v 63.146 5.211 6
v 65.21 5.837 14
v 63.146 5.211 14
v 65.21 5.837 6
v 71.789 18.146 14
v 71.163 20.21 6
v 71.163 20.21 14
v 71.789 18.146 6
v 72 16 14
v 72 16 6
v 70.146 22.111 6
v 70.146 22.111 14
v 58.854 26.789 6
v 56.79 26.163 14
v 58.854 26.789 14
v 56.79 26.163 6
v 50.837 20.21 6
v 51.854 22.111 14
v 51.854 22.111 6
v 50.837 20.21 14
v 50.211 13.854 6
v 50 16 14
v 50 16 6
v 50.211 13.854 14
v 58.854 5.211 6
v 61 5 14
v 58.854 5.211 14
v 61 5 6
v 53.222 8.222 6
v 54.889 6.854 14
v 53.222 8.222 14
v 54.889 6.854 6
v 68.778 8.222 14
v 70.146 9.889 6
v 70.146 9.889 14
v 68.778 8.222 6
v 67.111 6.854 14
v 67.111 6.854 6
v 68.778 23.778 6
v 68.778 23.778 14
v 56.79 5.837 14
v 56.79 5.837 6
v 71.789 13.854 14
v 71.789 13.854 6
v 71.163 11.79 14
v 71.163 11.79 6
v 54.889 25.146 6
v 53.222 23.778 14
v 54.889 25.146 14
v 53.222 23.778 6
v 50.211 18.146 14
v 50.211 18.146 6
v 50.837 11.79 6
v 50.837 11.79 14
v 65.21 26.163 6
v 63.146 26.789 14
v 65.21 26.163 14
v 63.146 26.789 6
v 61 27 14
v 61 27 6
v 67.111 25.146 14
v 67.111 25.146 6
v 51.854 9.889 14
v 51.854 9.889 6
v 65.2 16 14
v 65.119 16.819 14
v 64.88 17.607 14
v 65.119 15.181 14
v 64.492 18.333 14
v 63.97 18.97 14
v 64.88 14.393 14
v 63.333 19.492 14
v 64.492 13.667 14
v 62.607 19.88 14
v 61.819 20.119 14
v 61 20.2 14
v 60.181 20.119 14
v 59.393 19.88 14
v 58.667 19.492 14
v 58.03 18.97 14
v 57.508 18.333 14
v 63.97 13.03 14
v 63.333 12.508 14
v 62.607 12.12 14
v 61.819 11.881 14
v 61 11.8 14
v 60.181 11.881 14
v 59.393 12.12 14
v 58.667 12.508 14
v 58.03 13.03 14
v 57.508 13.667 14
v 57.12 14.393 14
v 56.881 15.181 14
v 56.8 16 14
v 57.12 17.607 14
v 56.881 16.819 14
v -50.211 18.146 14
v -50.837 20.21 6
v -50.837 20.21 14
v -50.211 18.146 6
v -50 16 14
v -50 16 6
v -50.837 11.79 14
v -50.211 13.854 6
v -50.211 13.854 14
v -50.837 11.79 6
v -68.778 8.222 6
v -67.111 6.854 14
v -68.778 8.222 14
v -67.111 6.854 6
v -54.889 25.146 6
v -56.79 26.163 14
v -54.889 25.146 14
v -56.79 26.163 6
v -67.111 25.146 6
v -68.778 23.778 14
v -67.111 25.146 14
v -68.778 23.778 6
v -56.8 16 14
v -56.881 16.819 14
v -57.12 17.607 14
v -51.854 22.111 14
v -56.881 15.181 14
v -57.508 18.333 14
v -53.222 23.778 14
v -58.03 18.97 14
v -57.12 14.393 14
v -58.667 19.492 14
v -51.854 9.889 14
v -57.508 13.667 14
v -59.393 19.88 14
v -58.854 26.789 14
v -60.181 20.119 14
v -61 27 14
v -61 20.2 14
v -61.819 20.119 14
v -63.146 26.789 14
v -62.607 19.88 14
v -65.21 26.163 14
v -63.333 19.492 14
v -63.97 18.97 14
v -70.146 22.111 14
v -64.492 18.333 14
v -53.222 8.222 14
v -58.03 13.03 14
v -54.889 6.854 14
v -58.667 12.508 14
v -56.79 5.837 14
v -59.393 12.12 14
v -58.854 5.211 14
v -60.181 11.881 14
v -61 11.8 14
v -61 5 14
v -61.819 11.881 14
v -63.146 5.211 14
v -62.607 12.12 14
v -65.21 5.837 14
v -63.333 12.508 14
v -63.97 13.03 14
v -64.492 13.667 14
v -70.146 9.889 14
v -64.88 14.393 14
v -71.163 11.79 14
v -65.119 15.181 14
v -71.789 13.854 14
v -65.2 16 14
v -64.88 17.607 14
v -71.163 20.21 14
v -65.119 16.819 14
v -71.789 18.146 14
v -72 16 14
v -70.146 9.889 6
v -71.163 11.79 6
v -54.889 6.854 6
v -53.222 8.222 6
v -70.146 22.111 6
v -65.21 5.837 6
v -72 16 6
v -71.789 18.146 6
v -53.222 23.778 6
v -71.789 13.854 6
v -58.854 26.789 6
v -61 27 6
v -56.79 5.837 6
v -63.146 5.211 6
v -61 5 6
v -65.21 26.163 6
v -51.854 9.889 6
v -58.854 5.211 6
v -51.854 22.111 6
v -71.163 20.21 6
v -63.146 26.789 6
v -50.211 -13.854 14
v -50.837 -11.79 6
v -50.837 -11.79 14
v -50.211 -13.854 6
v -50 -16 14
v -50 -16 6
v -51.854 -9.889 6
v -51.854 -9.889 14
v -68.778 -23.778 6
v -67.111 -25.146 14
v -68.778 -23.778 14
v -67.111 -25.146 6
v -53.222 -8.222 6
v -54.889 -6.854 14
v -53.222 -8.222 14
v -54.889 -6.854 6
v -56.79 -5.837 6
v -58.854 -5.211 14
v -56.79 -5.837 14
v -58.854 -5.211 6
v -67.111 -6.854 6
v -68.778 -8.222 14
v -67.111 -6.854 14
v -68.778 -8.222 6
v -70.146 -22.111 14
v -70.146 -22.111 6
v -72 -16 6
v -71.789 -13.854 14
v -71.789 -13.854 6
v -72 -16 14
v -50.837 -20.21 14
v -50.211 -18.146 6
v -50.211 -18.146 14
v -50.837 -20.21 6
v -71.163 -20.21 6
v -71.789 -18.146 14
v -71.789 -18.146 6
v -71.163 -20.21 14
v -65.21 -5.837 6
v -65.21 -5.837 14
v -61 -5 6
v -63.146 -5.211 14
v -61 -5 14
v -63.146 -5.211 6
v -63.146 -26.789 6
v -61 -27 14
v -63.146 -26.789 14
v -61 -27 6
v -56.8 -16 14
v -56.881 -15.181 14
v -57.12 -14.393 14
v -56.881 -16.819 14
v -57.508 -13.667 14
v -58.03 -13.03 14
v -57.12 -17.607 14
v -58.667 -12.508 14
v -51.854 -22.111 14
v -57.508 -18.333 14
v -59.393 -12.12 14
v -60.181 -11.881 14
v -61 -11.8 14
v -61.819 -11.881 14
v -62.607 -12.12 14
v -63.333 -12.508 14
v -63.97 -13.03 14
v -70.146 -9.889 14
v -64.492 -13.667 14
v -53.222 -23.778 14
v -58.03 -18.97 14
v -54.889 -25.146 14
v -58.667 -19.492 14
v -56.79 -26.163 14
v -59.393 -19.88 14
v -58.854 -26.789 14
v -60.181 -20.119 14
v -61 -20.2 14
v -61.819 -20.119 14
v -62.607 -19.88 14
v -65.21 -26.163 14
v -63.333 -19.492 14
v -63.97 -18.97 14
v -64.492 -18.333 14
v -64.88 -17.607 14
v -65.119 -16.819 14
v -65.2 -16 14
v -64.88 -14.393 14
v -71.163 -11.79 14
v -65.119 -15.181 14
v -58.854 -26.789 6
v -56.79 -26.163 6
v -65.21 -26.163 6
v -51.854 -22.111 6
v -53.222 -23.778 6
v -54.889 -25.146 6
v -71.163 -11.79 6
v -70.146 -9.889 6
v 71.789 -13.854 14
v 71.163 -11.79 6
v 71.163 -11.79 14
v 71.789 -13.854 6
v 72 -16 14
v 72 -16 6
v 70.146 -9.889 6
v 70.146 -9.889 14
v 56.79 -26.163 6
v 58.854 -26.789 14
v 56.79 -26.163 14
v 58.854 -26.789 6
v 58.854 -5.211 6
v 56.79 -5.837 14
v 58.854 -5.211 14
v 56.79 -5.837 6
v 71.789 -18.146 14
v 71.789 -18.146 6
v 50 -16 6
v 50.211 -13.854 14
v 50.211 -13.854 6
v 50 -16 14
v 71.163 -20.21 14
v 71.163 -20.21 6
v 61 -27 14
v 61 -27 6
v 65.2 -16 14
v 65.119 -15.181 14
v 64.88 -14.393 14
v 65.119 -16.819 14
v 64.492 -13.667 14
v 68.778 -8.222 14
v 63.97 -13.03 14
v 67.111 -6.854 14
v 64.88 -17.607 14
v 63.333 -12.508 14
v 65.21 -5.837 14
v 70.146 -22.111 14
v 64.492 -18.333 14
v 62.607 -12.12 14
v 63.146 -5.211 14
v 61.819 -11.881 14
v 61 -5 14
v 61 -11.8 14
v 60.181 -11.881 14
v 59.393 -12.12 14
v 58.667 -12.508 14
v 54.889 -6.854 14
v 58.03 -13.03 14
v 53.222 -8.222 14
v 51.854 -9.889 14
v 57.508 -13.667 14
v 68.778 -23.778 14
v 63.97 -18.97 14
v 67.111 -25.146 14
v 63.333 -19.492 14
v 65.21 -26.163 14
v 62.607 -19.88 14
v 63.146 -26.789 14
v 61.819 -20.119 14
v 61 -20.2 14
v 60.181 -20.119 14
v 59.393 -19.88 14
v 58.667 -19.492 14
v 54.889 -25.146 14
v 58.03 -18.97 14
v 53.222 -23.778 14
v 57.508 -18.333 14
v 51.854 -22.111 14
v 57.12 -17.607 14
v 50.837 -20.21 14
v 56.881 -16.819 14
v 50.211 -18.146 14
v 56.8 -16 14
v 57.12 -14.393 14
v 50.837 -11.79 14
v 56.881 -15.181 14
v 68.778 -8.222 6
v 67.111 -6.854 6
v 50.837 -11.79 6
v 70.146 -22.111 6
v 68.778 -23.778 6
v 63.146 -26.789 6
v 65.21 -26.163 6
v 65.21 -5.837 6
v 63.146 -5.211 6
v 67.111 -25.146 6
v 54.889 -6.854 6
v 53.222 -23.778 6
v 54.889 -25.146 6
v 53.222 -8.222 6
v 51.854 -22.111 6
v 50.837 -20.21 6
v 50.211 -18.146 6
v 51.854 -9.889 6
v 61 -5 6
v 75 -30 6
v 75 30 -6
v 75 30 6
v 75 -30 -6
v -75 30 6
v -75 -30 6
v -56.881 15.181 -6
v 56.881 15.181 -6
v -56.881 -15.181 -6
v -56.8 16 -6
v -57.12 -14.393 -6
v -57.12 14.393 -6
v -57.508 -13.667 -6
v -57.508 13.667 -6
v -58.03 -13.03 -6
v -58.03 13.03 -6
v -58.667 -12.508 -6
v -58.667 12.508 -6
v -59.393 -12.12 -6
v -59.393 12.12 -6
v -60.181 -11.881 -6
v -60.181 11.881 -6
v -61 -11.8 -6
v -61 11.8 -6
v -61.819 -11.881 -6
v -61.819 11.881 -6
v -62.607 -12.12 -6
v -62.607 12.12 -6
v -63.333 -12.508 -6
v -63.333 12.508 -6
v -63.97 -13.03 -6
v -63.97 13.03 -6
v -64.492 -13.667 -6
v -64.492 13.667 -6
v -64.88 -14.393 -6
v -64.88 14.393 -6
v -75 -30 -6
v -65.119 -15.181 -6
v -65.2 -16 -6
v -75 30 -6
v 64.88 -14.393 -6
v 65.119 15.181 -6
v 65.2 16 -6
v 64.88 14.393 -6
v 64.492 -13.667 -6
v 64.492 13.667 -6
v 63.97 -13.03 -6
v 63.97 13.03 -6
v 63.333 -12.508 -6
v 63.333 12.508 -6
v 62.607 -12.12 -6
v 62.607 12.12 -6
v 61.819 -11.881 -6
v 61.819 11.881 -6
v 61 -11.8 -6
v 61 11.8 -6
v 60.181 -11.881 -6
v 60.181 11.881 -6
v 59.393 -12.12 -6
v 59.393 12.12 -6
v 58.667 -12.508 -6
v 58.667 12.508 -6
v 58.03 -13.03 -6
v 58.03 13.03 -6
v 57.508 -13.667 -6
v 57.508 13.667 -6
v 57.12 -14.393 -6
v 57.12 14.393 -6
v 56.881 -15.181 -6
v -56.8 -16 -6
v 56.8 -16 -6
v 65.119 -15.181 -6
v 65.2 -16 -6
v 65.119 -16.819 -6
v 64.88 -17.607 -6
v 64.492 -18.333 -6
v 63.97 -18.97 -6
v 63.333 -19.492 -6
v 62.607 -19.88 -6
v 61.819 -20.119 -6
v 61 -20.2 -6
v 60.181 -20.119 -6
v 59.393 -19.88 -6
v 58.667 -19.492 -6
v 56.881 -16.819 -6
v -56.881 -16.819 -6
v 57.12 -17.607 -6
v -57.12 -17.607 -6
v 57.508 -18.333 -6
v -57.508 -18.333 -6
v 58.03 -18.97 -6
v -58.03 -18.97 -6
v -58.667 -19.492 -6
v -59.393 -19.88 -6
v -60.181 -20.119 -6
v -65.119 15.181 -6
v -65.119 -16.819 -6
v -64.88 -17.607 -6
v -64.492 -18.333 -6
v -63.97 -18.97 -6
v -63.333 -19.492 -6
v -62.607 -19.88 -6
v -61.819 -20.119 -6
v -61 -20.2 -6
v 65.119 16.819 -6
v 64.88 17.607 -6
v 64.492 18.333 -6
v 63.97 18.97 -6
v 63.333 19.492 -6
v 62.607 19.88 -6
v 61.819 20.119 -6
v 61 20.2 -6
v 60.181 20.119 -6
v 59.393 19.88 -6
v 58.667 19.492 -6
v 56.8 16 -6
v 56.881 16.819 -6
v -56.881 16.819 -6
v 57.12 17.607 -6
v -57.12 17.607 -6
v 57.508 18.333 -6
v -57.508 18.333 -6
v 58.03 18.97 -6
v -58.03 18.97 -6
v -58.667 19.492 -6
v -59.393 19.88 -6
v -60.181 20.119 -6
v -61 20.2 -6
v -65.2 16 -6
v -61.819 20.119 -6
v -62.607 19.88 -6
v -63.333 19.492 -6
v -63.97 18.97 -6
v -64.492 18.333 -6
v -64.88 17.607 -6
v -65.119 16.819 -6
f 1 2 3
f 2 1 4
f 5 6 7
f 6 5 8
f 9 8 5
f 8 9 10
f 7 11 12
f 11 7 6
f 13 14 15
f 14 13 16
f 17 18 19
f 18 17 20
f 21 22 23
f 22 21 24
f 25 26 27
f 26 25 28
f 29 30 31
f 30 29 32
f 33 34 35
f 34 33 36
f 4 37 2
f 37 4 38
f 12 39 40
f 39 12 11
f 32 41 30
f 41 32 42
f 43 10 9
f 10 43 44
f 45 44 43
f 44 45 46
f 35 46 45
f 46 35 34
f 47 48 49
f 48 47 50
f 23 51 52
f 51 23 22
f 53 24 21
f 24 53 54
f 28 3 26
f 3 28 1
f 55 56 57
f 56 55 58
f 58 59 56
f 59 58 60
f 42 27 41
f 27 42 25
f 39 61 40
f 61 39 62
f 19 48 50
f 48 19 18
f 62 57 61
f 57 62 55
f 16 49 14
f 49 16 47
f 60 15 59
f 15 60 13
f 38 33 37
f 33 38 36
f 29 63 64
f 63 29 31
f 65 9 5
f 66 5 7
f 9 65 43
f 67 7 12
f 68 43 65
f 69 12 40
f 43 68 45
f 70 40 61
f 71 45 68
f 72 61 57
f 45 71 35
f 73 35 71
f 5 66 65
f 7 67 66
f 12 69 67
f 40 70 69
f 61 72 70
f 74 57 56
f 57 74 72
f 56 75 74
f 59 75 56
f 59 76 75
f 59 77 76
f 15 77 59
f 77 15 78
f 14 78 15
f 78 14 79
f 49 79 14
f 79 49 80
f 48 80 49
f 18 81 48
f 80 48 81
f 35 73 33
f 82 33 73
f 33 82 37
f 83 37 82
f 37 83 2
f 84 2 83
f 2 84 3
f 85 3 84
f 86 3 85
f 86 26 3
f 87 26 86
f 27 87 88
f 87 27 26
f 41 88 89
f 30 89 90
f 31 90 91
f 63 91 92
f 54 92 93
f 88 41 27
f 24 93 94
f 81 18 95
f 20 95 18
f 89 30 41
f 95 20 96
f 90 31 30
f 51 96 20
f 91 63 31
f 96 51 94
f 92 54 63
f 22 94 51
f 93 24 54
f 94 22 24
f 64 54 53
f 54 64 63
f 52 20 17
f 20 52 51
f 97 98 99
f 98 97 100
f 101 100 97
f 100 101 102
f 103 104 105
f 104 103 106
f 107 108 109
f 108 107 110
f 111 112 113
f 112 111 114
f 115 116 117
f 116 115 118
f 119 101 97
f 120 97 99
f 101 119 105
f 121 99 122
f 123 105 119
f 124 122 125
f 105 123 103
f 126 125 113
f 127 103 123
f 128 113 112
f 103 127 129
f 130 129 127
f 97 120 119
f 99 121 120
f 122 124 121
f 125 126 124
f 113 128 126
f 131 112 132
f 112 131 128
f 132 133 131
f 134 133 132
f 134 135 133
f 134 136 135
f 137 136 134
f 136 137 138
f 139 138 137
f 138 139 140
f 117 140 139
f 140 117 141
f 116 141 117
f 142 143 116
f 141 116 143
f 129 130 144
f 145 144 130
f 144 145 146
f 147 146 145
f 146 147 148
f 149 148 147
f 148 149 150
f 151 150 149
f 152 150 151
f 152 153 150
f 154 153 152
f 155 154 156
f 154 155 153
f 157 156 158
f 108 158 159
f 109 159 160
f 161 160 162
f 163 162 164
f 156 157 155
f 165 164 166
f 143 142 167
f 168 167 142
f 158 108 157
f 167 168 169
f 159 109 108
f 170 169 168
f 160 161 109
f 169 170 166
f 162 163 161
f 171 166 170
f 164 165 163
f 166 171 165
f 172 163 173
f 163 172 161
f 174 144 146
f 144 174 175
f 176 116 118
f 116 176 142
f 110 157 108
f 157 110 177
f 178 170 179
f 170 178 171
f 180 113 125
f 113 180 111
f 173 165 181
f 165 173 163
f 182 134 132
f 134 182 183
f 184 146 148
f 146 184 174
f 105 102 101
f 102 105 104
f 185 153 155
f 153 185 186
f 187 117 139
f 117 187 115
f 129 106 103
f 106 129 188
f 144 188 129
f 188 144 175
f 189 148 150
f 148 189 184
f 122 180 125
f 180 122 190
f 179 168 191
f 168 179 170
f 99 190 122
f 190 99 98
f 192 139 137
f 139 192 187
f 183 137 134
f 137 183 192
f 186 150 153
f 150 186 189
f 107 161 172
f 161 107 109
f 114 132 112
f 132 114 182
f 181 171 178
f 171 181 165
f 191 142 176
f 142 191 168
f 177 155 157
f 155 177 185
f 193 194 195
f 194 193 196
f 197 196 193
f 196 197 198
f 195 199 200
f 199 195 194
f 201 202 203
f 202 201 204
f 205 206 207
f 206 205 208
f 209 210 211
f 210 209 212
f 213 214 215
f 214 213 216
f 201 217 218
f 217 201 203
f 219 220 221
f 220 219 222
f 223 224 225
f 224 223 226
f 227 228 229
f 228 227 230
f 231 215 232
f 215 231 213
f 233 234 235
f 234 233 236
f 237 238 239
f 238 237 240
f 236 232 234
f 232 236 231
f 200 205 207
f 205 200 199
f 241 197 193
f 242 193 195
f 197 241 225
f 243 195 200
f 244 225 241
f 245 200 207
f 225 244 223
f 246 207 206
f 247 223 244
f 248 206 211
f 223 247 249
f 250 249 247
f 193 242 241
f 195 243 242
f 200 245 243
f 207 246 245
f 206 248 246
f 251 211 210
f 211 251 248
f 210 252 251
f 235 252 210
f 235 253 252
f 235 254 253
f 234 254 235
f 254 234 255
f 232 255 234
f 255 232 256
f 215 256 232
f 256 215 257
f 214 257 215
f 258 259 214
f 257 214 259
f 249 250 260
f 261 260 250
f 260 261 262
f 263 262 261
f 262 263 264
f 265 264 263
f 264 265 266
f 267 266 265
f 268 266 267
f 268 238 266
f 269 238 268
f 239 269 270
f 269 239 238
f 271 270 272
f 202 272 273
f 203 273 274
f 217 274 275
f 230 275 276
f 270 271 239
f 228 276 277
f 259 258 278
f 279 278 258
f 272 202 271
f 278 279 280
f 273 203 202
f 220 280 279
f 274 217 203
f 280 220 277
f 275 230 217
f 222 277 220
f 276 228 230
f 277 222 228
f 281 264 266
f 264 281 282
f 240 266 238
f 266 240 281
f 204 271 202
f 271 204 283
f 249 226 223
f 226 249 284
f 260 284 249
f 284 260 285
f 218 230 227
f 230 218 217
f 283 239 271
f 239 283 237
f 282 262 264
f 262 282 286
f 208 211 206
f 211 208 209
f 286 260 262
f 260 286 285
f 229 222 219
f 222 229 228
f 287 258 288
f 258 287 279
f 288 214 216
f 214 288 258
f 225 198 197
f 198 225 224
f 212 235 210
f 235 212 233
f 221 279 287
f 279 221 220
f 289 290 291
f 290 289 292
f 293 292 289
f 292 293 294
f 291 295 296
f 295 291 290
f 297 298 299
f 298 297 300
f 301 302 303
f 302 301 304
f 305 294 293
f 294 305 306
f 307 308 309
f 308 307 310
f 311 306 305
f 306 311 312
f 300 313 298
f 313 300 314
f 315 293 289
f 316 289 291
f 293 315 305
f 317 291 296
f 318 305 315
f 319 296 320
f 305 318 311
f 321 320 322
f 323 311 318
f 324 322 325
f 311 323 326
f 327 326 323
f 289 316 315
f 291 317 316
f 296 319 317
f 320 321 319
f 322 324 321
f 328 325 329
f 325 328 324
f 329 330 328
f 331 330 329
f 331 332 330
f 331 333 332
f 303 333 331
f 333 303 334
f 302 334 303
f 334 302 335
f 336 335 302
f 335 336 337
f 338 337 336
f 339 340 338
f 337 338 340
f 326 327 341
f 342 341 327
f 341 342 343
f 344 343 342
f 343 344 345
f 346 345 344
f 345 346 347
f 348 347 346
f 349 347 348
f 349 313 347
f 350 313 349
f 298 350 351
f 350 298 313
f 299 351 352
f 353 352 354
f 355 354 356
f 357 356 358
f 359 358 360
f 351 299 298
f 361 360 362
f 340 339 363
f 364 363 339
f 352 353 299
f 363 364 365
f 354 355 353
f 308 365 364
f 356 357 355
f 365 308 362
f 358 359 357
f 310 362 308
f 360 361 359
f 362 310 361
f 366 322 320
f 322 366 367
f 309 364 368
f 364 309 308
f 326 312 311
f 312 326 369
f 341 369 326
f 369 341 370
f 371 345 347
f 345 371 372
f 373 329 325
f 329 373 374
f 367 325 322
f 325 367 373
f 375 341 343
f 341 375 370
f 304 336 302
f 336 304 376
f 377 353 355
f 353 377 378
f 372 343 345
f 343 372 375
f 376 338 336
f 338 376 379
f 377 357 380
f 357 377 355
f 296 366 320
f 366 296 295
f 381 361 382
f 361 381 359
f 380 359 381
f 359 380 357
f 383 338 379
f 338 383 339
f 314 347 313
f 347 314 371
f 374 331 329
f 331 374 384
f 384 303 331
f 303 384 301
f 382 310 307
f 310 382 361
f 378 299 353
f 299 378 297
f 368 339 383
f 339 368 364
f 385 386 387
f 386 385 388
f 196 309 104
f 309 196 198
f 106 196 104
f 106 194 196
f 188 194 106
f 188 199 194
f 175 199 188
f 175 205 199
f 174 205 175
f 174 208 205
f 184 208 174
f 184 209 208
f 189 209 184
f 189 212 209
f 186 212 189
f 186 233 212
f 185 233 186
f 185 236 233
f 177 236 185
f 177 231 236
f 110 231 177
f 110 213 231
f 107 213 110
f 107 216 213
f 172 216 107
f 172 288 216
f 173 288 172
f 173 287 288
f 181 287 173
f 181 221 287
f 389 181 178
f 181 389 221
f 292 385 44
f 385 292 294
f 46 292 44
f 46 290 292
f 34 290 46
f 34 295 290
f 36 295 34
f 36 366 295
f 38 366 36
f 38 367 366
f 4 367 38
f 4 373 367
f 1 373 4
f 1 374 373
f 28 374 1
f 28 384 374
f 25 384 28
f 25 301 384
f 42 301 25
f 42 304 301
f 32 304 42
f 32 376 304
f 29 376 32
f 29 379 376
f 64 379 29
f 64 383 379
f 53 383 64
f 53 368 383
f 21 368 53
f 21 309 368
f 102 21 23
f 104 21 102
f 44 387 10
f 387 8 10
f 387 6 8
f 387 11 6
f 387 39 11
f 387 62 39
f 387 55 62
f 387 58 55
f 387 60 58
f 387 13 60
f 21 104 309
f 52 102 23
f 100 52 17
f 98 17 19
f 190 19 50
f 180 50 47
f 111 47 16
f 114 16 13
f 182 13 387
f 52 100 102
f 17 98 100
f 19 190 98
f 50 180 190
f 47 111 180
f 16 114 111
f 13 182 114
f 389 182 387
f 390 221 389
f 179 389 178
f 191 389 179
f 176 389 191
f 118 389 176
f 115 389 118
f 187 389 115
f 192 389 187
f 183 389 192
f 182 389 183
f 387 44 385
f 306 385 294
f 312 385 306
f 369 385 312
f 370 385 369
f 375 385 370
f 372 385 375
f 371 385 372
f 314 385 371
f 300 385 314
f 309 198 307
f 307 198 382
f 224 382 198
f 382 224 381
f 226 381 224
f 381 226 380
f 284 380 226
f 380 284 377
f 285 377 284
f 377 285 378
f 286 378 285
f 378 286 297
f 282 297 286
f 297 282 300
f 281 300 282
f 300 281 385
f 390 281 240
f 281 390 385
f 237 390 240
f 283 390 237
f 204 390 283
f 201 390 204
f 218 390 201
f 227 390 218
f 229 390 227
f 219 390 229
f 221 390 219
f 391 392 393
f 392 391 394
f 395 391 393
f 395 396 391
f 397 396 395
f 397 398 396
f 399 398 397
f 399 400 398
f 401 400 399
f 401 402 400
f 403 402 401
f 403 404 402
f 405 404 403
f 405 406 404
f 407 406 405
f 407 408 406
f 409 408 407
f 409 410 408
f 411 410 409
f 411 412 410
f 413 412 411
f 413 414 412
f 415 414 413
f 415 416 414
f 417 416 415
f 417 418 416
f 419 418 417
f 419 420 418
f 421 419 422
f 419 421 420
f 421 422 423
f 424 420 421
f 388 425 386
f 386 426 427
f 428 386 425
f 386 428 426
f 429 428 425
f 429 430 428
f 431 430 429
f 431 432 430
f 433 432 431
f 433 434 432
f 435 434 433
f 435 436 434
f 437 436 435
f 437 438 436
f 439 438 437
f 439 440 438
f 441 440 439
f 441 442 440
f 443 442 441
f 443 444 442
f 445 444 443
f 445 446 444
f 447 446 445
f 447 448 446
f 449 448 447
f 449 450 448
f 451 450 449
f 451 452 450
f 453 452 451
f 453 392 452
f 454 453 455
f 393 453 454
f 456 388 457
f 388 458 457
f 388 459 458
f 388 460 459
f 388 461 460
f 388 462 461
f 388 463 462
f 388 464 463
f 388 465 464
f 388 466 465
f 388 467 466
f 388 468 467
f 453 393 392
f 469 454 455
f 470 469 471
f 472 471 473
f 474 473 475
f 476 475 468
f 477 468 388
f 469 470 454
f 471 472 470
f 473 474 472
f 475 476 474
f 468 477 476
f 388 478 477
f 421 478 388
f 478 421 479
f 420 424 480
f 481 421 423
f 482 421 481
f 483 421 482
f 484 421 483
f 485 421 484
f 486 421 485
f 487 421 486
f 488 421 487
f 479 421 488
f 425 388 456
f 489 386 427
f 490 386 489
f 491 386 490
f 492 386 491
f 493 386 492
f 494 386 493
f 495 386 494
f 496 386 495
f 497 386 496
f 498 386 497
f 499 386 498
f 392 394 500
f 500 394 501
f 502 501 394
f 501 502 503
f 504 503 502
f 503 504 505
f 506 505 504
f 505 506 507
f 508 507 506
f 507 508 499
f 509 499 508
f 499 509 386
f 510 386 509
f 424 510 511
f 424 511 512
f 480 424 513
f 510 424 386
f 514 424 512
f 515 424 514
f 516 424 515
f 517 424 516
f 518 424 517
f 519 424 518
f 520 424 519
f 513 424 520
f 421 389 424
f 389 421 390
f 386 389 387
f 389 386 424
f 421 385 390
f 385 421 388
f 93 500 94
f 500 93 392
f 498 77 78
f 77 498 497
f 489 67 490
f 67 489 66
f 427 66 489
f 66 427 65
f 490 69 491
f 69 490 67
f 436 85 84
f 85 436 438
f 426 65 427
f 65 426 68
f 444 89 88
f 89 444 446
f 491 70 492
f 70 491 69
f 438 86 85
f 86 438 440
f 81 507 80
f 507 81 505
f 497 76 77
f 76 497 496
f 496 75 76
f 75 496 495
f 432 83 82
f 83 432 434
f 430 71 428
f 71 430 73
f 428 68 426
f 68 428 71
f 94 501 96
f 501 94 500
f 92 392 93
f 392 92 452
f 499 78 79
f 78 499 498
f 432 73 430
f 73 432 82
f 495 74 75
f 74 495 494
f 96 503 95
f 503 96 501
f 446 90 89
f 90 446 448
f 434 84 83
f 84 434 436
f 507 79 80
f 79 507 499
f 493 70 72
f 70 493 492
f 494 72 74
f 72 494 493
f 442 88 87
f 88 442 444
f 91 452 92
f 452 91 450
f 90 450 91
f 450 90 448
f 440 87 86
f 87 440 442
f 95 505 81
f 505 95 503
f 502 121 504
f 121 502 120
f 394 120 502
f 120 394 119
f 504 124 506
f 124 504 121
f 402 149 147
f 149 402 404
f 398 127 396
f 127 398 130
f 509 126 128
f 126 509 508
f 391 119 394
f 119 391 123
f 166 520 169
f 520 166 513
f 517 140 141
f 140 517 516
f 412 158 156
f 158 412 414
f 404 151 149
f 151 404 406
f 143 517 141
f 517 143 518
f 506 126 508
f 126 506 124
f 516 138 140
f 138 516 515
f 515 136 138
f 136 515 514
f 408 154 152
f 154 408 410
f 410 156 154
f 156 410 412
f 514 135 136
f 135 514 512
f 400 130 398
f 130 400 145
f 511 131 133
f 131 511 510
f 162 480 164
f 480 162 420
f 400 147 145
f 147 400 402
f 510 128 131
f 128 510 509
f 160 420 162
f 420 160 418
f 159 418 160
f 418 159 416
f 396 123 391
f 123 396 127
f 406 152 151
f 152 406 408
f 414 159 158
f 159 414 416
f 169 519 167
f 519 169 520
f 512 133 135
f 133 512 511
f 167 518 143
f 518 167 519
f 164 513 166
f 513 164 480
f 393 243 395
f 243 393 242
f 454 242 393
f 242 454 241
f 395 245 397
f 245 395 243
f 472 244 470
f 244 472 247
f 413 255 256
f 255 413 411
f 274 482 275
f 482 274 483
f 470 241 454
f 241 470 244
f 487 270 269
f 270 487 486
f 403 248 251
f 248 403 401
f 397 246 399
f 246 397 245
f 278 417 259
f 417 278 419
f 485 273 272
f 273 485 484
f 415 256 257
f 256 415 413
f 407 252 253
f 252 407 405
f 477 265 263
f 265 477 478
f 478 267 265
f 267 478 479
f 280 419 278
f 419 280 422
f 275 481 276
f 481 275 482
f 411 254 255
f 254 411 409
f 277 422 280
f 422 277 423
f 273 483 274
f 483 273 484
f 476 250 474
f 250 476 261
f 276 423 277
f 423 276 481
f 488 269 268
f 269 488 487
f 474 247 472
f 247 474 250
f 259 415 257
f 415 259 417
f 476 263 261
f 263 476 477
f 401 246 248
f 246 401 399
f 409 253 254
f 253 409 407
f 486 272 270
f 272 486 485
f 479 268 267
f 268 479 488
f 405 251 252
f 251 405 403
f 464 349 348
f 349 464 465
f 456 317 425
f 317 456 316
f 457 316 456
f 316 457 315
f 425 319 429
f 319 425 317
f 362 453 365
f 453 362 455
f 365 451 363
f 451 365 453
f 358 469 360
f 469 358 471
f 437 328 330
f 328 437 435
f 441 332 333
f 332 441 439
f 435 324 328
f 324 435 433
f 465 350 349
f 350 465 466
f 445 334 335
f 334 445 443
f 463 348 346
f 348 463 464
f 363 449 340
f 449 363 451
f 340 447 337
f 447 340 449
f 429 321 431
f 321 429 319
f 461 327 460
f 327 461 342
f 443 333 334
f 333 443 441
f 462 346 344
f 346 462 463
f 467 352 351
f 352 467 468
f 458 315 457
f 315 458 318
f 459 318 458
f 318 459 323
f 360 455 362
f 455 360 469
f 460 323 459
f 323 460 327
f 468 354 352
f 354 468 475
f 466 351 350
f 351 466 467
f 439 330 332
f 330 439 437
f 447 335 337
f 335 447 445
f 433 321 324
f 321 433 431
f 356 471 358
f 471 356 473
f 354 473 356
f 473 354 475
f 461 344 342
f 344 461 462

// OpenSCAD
$fn = 32;

// ----------------------------------------------------------------------
// Anchor pads 150 x 60 x 20
// four corner bosses with anchor holes
// ----------------------------------------------------------------------

// --- parameters (mm) ---
plate = [150, 60, 12];  // base plate size (x, y, z)
pads = 4;               // boss count, one per corner
edge = 14;              // boss centre offset from the plate edge
boss_d = 22;            // boss diameter
boss_h = 8;             // boss height above the base plate
hole_d = 8.4;           // hole diameter

// --- derived feature positions (mm) ---
height = plate[2] + boss_h;      // = 20   overall height of the part
corner_x = plate[0] / 2 - edge;  // = 61   boss centre X
corner_y = plate[1] / 2 - edge;  // = 16   boss centre Y
feature_centers = [
  [corner_x, corner_y],
  [-corner_x, corner_y],
  [-corner_x, -corner_y],
  [corner_x, -corner_y]
];   // boss centres, anchor holes are drilled there

// base plate, four bosses standing on it, anchor holes all the way through
difference() {
  union() {
    cube(plate, center = true);
    for (centre = feature_centers)
      translate([centre[0], centre[1], plate[2] / 2 - 1])
        cylinder(d = boss_d, h = boss_h + 1);
  }
  for (centre = feature_centers)
    translate([centre[0], centre[1], -height])
      cylinder(d = hole_d, h = 2 * height + 2);  // through boss and plate
}
